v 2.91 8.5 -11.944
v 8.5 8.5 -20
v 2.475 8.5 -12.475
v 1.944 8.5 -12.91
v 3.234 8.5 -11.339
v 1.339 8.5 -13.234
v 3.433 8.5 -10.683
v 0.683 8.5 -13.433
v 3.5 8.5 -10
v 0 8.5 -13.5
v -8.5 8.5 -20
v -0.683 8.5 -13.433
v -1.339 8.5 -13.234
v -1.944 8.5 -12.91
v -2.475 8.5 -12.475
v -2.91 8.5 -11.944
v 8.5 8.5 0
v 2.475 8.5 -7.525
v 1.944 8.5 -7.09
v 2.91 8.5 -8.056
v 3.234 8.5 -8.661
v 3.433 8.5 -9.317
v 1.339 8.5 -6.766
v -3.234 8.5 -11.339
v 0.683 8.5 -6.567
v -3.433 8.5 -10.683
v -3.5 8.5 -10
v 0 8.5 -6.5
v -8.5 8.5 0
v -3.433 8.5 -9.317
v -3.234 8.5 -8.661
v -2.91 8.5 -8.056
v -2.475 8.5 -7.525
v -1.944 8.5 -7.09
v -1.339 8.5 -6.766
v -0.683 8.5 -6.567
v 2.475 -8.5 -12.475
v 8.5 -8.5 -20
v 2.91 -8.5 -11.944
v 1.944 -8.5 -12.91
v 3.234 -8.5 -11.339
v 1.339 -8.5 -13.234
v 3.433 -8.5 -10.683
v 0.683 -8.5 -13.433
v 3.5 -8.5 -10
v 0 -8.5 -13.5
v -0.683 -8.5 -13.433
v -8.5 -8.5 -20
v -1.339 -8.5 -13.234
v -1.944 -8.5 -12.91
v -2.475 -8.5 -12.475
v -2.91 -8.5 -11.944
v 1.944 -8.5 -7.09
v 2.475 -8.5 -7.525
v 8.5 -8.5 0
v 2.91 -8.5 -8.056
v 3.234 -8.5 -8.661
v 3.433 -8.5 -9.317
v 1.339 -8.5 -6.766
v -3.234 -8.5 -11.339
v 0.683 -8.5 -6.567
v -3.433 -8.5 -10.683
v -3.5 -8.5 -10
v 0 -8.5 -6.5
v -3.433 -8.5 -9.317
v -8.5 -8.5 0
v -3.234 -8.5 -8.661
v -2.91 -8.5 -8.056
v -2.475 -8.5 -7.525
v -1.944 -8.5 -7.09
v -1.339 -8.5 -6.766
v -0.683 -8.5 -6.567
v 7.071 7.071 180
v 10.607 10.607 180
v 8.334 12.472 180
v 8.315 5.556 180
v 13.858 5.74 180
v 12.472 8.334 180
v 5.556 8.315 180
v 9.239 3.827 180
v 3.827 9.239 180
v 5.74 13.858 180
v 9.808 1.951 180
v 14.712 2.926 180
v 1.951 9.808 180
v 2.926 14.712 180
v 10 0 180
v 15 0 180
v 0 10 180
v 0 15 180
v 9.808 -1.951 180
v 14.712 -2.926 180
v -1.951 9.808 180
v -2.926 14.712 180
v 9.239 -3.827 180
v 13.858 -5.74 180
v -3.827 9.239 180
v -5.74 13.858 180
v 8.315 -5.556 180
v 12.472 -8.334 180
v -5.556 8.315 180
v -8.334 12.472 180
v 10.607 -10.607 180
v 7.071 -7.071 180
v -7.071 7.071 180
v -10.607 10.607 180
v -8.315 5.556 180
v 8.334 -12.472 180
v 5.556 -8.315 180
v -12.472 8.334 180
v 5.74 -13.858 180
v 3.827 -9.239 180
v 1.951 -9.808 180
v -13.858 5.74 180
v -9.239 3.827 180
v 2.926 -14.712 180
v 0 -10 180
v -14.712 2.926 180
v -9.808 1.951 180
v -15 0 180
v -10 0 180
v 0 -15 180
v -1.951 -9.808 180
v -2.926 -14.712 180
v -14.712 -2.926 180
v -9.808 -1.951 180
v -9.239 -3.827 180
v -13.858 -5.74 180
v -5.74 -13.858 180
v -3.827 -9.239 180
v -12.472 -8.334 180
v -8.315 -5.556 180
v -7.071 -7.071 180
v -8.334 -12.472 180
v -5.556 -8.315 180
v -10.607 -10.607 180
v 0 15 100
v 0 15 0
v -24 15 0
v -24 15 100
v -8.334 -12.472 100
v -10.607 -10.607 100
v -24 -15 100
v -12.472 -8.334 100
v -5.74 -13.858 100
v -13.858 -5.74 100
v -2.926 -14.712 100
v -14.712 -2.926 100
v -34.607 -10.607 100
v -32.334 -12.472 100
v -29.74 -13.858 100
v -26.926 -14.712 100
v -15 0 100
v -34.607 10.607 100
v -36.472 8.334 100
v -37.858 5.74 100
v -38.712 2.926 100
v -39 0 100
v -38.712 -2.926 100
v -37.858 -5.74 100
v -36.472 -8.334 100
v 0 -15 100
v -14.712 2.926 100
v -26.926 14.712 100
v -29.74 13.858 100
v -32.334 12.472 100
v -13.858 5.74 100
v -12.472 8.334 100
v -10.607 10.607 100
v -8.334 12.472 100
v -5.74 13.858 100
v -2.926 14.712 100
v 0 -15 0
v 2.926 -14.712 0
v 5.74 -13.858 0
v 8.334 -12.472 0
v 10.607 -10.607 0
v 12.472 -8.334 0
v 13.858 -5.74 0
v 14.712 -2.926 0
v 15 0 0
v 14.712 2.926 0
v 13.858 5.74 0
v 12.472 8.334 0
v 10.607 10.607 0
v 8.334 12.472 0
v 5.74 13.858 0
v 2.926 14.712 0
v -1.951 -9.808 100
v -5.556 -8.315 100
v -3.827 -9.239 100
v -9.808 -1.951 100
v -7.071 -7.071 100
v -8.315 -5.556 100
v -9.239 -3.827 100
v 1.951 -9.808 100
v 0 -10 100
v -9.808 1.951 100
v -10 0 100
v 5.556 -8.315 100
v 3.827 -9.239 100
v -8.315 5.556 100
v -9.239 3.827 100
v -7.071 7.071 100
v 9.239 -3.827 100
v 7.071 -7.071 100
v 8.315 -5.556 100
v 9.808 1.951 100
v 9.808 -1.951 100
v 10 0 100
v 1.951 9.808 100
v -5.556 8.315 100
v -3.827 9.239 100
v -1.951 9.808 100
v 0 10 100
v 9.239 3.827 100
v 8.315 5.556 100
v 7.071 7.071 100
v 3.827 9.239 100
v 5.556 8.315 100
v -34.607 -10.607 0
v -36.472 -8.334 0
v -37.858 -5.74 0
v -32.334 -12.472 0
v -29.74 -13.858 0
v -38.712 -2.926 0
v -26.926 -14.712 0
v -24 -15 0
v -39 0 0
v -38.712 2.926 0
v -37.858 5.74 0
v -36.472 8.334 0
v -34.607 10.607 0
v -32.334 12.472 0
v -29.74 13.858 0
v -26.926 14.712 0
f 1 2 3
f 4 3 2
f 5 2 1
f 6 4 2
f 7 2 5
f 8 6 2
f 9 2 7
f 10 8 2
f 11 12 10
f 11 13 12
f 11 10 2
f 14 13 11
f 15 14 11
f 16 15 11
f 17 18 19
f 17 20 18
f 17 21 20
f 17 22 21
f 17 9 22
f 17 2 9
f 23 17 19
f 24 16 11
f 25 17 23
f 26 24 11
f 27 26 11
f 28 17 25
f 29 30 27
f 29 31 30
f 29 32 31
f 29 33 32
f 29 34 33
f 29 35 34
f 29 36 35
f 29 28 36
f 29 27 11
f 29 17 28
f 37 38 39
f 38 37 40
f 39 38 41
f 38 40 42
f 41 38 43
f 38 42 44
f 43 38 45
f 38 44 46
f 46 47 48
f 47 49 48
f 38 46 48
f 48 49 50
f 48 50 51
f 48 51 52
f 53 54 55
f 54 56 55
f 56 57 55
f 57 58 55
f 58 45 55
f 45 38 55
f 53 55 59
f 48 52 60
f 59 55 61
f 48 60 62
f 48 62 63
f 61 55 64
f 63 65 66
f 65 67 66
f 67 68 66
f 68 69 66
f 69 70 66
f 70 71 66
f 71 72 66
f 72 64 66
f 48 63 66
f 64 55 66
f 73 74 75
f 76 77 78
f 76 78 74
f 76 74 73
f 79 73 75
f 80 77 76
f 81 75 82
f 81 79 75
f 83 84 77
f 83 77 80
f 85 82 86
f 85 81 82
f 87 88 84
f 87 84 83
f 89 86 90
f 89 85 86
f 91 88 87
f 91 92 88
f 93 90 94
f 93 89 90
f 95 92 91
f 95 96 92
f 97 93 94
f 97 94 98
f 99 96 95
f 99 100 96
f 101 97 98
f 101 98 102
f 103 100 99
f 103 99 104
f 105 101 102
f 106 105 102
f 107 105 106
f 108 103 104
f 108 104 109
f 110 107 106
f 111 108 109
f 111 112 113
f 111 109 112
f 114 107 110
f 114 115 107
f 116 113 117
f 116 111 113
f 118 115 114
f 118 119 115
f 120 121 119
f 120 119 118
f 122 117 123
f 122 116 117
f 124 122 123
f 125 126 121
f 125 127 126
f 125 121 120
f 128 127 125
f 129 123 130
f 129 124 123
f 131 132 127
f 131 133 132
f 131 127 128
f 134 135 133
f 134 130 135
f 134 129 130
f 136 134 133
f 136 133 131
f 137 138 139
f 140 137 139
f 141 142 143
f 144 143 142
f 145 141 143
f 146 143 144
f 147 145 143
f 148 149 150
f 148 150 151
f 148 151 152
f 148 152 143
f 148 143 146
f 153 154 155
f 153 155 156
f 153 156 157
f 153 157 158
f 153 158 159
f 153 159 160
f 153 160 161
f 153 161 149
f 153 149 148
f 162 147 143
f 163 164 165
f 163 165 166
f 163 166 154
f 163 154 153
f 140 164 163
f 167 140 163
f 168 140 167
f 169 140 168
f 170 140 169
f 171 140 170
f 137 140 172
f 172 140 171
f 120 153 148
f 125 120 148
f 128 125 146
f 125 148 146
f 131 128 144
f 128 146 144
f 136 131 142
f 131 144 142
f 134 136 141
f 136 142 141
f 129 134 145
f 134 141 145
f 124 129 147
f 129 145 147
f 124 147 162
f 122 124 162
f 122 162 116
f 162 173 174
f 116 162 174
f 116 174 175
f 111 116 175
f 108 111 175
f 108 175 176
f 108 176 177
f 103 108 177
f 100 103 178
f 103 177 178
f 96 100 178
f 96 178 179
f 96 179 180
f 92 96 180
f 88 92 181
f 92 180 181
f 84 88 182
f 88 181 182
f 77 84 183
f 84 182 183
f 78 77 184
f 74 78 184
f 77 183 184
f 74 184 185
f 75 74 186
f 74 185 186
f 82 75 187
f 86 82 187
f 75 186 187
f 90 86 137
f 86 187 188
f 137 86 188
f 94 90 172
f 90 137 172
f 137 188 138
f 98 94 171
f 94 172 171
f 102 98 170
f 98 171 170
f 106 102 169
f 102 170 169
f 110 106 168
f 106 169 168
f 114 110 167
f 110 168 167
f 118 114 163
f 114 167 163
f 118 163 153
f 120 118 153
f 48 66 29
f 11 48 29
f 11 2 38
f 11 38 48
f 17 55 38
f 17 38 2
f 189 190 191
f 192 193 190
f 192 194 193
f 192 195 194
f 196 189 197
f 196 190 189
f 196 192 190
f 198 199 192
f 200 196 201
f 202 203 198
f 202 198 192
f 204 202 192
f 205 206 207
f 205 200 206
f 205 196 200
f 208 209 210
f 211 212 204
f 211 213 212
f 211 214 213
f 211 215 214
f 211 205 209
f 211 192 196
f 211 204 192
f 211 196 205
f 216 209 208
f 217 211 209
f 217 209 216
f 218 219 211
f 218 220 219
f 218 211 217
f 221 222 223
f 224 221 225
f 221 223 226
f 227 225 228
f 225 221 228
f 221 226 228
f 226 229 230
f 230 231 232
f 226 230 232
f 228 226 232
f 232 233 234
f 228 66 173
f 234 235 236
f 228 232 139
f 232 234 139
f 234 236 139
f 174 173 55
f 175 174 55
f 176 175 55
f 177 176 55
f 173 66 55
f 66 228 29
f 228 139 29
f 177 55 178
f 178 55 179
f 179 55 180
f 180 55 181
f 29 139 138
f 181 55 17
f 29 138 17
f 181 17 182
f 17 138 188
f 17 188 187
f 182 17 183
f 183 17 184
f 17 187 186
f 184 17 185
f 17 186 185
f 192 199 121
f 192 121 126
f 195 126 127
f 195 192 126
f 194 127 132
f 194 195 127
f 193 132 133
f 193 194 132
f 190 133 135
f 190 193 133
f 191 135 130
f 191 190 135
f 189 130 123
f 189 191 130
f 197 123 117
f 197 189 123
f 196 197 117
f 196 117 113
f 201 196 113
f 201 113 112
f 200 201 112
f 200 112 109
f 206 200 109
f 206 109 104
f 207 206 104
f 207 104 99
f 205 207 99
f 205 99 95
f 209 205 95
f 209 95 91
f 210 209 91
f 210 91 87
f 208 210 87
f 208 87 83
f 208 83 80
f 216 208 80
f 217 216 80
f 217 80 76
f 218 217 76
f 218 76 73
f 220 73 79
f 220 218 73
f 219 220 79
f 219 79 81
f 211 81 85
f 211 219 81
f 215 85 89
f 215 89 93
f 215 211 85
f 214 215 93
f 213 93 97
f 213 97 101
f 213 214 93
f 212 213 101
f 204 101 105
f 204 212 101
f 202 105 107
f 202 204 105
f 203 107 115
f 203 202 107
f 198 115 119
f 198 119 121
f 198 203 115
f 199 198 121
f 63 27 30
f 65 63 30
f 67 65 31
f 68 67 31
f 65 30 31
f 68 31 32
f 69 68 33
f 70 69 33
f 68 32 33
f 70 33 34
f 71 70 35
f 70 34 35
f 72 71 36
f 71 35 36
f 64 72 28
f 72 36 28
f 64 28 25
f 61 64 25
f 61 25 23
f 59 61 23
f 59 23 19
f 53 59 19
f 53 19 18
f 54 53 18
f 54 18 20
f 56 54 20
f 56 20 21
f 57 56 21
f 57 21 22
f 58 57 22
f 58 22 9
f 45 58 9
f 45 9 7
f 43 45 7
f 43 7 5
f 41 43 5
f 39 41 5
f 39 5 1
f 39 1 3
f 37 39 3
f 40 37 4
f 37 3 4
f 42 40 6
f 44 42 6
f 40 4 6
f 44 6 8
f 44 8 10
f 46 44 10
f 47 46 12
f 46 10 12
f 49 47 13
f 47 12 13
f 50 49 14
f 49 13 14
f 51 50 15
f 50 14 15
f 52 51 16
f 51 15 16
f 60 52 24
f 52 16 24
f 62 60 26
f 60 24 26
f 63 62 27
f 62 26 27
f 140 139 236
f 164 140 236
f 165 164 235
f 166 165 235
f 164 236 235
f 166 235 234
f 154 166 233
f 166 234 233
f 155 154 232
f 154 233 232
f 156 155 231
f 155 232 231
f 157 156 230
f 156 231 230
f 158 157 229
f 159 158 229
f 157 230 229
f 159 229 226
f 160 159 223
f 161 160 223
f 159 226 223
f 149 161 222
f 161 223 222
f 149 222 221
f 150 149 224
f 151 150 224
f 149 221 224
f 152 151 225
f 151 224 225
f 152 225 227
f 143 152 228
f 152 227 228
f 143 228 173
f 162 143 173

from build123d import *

# Parameters (mm, degrees)
ESQUISSE1_R             = 15
ESQUISSE1_R_2           = 10
BOSS_EXTRU_1_DEPTH      = 180
BOSS_EXTRU_2_DEPTH      = 100
ESQUISSE3_W             = 17
ESQUISSE3_H             = 17
BOSS_EXTRU_3_DEPTH      = 20
ESQUISSE4_R             = 3.5
ENL_V_MAT_EXTRU_1_DEPTH = 20


with BuildPart() as part:
    # Esquisse1 → Boss.-Extru.1 (new body)
    with BuildSketch(Plane.XY):
        with Locations(Location((0, 0, 0), (0, 0, 180))):
            Circle(ESQUISSE1_R)
        with Locations(Location((0, 0, 0), (0, 0, 180))):
            Circle(ESQUISSE1_R_2, mode=Mode.SUBTRACT)
    extrude(amount=BOSS_EXTRU_1_DEPTH)

    # Esquisse2 → Boss.-Extru.2 (add)
    with BuildSketch(Plane(origin=(0, 0, 0), x_dir=(-1, 0, 0), z_dir=(0, 0, -1))):
        with BuildLine():
            Line((0, 15), (24, 15))
            ThreePointArc((24, 15), (39, 0), (24, -15))
            Line((24, -15), (0, -15))
            ThreePointArc((0, -15), (-15, 0), (0, 15))
        make_face()
    extrude(amount=-BOSS_EXTRU_2_DEPTH)

    # Esquisse3 → Boss.-Extru.3 (add)
    with BuildSketch(Plane(origin=(0, 0, 0), x_dir=(-1, 0, 0), z_dir=(0, 0, -1))):
        Rectangle(ESQUISSE3_W, ESQUISSE3_H)
    extrude(amount=BOSS_EXTRU_3_DEPTH)

    # Esquisse4 → Enlèv. mat.-Extru.1 (cut)
    with BuildSketch(Plane(origin=(0, 8.5, 0), x_dir=(1, 0, 0), z_dir=(0, 1, 0))):
        with Locations(Location((0, 10, 0), (0, 0, 180))):
            Circle(ESQUISSE4_R)
    extrude(amount=-ENL_V_MAT_EXTRU_1_DEPTH, mode=Mode.SUBTRACT)


solid = part.part
